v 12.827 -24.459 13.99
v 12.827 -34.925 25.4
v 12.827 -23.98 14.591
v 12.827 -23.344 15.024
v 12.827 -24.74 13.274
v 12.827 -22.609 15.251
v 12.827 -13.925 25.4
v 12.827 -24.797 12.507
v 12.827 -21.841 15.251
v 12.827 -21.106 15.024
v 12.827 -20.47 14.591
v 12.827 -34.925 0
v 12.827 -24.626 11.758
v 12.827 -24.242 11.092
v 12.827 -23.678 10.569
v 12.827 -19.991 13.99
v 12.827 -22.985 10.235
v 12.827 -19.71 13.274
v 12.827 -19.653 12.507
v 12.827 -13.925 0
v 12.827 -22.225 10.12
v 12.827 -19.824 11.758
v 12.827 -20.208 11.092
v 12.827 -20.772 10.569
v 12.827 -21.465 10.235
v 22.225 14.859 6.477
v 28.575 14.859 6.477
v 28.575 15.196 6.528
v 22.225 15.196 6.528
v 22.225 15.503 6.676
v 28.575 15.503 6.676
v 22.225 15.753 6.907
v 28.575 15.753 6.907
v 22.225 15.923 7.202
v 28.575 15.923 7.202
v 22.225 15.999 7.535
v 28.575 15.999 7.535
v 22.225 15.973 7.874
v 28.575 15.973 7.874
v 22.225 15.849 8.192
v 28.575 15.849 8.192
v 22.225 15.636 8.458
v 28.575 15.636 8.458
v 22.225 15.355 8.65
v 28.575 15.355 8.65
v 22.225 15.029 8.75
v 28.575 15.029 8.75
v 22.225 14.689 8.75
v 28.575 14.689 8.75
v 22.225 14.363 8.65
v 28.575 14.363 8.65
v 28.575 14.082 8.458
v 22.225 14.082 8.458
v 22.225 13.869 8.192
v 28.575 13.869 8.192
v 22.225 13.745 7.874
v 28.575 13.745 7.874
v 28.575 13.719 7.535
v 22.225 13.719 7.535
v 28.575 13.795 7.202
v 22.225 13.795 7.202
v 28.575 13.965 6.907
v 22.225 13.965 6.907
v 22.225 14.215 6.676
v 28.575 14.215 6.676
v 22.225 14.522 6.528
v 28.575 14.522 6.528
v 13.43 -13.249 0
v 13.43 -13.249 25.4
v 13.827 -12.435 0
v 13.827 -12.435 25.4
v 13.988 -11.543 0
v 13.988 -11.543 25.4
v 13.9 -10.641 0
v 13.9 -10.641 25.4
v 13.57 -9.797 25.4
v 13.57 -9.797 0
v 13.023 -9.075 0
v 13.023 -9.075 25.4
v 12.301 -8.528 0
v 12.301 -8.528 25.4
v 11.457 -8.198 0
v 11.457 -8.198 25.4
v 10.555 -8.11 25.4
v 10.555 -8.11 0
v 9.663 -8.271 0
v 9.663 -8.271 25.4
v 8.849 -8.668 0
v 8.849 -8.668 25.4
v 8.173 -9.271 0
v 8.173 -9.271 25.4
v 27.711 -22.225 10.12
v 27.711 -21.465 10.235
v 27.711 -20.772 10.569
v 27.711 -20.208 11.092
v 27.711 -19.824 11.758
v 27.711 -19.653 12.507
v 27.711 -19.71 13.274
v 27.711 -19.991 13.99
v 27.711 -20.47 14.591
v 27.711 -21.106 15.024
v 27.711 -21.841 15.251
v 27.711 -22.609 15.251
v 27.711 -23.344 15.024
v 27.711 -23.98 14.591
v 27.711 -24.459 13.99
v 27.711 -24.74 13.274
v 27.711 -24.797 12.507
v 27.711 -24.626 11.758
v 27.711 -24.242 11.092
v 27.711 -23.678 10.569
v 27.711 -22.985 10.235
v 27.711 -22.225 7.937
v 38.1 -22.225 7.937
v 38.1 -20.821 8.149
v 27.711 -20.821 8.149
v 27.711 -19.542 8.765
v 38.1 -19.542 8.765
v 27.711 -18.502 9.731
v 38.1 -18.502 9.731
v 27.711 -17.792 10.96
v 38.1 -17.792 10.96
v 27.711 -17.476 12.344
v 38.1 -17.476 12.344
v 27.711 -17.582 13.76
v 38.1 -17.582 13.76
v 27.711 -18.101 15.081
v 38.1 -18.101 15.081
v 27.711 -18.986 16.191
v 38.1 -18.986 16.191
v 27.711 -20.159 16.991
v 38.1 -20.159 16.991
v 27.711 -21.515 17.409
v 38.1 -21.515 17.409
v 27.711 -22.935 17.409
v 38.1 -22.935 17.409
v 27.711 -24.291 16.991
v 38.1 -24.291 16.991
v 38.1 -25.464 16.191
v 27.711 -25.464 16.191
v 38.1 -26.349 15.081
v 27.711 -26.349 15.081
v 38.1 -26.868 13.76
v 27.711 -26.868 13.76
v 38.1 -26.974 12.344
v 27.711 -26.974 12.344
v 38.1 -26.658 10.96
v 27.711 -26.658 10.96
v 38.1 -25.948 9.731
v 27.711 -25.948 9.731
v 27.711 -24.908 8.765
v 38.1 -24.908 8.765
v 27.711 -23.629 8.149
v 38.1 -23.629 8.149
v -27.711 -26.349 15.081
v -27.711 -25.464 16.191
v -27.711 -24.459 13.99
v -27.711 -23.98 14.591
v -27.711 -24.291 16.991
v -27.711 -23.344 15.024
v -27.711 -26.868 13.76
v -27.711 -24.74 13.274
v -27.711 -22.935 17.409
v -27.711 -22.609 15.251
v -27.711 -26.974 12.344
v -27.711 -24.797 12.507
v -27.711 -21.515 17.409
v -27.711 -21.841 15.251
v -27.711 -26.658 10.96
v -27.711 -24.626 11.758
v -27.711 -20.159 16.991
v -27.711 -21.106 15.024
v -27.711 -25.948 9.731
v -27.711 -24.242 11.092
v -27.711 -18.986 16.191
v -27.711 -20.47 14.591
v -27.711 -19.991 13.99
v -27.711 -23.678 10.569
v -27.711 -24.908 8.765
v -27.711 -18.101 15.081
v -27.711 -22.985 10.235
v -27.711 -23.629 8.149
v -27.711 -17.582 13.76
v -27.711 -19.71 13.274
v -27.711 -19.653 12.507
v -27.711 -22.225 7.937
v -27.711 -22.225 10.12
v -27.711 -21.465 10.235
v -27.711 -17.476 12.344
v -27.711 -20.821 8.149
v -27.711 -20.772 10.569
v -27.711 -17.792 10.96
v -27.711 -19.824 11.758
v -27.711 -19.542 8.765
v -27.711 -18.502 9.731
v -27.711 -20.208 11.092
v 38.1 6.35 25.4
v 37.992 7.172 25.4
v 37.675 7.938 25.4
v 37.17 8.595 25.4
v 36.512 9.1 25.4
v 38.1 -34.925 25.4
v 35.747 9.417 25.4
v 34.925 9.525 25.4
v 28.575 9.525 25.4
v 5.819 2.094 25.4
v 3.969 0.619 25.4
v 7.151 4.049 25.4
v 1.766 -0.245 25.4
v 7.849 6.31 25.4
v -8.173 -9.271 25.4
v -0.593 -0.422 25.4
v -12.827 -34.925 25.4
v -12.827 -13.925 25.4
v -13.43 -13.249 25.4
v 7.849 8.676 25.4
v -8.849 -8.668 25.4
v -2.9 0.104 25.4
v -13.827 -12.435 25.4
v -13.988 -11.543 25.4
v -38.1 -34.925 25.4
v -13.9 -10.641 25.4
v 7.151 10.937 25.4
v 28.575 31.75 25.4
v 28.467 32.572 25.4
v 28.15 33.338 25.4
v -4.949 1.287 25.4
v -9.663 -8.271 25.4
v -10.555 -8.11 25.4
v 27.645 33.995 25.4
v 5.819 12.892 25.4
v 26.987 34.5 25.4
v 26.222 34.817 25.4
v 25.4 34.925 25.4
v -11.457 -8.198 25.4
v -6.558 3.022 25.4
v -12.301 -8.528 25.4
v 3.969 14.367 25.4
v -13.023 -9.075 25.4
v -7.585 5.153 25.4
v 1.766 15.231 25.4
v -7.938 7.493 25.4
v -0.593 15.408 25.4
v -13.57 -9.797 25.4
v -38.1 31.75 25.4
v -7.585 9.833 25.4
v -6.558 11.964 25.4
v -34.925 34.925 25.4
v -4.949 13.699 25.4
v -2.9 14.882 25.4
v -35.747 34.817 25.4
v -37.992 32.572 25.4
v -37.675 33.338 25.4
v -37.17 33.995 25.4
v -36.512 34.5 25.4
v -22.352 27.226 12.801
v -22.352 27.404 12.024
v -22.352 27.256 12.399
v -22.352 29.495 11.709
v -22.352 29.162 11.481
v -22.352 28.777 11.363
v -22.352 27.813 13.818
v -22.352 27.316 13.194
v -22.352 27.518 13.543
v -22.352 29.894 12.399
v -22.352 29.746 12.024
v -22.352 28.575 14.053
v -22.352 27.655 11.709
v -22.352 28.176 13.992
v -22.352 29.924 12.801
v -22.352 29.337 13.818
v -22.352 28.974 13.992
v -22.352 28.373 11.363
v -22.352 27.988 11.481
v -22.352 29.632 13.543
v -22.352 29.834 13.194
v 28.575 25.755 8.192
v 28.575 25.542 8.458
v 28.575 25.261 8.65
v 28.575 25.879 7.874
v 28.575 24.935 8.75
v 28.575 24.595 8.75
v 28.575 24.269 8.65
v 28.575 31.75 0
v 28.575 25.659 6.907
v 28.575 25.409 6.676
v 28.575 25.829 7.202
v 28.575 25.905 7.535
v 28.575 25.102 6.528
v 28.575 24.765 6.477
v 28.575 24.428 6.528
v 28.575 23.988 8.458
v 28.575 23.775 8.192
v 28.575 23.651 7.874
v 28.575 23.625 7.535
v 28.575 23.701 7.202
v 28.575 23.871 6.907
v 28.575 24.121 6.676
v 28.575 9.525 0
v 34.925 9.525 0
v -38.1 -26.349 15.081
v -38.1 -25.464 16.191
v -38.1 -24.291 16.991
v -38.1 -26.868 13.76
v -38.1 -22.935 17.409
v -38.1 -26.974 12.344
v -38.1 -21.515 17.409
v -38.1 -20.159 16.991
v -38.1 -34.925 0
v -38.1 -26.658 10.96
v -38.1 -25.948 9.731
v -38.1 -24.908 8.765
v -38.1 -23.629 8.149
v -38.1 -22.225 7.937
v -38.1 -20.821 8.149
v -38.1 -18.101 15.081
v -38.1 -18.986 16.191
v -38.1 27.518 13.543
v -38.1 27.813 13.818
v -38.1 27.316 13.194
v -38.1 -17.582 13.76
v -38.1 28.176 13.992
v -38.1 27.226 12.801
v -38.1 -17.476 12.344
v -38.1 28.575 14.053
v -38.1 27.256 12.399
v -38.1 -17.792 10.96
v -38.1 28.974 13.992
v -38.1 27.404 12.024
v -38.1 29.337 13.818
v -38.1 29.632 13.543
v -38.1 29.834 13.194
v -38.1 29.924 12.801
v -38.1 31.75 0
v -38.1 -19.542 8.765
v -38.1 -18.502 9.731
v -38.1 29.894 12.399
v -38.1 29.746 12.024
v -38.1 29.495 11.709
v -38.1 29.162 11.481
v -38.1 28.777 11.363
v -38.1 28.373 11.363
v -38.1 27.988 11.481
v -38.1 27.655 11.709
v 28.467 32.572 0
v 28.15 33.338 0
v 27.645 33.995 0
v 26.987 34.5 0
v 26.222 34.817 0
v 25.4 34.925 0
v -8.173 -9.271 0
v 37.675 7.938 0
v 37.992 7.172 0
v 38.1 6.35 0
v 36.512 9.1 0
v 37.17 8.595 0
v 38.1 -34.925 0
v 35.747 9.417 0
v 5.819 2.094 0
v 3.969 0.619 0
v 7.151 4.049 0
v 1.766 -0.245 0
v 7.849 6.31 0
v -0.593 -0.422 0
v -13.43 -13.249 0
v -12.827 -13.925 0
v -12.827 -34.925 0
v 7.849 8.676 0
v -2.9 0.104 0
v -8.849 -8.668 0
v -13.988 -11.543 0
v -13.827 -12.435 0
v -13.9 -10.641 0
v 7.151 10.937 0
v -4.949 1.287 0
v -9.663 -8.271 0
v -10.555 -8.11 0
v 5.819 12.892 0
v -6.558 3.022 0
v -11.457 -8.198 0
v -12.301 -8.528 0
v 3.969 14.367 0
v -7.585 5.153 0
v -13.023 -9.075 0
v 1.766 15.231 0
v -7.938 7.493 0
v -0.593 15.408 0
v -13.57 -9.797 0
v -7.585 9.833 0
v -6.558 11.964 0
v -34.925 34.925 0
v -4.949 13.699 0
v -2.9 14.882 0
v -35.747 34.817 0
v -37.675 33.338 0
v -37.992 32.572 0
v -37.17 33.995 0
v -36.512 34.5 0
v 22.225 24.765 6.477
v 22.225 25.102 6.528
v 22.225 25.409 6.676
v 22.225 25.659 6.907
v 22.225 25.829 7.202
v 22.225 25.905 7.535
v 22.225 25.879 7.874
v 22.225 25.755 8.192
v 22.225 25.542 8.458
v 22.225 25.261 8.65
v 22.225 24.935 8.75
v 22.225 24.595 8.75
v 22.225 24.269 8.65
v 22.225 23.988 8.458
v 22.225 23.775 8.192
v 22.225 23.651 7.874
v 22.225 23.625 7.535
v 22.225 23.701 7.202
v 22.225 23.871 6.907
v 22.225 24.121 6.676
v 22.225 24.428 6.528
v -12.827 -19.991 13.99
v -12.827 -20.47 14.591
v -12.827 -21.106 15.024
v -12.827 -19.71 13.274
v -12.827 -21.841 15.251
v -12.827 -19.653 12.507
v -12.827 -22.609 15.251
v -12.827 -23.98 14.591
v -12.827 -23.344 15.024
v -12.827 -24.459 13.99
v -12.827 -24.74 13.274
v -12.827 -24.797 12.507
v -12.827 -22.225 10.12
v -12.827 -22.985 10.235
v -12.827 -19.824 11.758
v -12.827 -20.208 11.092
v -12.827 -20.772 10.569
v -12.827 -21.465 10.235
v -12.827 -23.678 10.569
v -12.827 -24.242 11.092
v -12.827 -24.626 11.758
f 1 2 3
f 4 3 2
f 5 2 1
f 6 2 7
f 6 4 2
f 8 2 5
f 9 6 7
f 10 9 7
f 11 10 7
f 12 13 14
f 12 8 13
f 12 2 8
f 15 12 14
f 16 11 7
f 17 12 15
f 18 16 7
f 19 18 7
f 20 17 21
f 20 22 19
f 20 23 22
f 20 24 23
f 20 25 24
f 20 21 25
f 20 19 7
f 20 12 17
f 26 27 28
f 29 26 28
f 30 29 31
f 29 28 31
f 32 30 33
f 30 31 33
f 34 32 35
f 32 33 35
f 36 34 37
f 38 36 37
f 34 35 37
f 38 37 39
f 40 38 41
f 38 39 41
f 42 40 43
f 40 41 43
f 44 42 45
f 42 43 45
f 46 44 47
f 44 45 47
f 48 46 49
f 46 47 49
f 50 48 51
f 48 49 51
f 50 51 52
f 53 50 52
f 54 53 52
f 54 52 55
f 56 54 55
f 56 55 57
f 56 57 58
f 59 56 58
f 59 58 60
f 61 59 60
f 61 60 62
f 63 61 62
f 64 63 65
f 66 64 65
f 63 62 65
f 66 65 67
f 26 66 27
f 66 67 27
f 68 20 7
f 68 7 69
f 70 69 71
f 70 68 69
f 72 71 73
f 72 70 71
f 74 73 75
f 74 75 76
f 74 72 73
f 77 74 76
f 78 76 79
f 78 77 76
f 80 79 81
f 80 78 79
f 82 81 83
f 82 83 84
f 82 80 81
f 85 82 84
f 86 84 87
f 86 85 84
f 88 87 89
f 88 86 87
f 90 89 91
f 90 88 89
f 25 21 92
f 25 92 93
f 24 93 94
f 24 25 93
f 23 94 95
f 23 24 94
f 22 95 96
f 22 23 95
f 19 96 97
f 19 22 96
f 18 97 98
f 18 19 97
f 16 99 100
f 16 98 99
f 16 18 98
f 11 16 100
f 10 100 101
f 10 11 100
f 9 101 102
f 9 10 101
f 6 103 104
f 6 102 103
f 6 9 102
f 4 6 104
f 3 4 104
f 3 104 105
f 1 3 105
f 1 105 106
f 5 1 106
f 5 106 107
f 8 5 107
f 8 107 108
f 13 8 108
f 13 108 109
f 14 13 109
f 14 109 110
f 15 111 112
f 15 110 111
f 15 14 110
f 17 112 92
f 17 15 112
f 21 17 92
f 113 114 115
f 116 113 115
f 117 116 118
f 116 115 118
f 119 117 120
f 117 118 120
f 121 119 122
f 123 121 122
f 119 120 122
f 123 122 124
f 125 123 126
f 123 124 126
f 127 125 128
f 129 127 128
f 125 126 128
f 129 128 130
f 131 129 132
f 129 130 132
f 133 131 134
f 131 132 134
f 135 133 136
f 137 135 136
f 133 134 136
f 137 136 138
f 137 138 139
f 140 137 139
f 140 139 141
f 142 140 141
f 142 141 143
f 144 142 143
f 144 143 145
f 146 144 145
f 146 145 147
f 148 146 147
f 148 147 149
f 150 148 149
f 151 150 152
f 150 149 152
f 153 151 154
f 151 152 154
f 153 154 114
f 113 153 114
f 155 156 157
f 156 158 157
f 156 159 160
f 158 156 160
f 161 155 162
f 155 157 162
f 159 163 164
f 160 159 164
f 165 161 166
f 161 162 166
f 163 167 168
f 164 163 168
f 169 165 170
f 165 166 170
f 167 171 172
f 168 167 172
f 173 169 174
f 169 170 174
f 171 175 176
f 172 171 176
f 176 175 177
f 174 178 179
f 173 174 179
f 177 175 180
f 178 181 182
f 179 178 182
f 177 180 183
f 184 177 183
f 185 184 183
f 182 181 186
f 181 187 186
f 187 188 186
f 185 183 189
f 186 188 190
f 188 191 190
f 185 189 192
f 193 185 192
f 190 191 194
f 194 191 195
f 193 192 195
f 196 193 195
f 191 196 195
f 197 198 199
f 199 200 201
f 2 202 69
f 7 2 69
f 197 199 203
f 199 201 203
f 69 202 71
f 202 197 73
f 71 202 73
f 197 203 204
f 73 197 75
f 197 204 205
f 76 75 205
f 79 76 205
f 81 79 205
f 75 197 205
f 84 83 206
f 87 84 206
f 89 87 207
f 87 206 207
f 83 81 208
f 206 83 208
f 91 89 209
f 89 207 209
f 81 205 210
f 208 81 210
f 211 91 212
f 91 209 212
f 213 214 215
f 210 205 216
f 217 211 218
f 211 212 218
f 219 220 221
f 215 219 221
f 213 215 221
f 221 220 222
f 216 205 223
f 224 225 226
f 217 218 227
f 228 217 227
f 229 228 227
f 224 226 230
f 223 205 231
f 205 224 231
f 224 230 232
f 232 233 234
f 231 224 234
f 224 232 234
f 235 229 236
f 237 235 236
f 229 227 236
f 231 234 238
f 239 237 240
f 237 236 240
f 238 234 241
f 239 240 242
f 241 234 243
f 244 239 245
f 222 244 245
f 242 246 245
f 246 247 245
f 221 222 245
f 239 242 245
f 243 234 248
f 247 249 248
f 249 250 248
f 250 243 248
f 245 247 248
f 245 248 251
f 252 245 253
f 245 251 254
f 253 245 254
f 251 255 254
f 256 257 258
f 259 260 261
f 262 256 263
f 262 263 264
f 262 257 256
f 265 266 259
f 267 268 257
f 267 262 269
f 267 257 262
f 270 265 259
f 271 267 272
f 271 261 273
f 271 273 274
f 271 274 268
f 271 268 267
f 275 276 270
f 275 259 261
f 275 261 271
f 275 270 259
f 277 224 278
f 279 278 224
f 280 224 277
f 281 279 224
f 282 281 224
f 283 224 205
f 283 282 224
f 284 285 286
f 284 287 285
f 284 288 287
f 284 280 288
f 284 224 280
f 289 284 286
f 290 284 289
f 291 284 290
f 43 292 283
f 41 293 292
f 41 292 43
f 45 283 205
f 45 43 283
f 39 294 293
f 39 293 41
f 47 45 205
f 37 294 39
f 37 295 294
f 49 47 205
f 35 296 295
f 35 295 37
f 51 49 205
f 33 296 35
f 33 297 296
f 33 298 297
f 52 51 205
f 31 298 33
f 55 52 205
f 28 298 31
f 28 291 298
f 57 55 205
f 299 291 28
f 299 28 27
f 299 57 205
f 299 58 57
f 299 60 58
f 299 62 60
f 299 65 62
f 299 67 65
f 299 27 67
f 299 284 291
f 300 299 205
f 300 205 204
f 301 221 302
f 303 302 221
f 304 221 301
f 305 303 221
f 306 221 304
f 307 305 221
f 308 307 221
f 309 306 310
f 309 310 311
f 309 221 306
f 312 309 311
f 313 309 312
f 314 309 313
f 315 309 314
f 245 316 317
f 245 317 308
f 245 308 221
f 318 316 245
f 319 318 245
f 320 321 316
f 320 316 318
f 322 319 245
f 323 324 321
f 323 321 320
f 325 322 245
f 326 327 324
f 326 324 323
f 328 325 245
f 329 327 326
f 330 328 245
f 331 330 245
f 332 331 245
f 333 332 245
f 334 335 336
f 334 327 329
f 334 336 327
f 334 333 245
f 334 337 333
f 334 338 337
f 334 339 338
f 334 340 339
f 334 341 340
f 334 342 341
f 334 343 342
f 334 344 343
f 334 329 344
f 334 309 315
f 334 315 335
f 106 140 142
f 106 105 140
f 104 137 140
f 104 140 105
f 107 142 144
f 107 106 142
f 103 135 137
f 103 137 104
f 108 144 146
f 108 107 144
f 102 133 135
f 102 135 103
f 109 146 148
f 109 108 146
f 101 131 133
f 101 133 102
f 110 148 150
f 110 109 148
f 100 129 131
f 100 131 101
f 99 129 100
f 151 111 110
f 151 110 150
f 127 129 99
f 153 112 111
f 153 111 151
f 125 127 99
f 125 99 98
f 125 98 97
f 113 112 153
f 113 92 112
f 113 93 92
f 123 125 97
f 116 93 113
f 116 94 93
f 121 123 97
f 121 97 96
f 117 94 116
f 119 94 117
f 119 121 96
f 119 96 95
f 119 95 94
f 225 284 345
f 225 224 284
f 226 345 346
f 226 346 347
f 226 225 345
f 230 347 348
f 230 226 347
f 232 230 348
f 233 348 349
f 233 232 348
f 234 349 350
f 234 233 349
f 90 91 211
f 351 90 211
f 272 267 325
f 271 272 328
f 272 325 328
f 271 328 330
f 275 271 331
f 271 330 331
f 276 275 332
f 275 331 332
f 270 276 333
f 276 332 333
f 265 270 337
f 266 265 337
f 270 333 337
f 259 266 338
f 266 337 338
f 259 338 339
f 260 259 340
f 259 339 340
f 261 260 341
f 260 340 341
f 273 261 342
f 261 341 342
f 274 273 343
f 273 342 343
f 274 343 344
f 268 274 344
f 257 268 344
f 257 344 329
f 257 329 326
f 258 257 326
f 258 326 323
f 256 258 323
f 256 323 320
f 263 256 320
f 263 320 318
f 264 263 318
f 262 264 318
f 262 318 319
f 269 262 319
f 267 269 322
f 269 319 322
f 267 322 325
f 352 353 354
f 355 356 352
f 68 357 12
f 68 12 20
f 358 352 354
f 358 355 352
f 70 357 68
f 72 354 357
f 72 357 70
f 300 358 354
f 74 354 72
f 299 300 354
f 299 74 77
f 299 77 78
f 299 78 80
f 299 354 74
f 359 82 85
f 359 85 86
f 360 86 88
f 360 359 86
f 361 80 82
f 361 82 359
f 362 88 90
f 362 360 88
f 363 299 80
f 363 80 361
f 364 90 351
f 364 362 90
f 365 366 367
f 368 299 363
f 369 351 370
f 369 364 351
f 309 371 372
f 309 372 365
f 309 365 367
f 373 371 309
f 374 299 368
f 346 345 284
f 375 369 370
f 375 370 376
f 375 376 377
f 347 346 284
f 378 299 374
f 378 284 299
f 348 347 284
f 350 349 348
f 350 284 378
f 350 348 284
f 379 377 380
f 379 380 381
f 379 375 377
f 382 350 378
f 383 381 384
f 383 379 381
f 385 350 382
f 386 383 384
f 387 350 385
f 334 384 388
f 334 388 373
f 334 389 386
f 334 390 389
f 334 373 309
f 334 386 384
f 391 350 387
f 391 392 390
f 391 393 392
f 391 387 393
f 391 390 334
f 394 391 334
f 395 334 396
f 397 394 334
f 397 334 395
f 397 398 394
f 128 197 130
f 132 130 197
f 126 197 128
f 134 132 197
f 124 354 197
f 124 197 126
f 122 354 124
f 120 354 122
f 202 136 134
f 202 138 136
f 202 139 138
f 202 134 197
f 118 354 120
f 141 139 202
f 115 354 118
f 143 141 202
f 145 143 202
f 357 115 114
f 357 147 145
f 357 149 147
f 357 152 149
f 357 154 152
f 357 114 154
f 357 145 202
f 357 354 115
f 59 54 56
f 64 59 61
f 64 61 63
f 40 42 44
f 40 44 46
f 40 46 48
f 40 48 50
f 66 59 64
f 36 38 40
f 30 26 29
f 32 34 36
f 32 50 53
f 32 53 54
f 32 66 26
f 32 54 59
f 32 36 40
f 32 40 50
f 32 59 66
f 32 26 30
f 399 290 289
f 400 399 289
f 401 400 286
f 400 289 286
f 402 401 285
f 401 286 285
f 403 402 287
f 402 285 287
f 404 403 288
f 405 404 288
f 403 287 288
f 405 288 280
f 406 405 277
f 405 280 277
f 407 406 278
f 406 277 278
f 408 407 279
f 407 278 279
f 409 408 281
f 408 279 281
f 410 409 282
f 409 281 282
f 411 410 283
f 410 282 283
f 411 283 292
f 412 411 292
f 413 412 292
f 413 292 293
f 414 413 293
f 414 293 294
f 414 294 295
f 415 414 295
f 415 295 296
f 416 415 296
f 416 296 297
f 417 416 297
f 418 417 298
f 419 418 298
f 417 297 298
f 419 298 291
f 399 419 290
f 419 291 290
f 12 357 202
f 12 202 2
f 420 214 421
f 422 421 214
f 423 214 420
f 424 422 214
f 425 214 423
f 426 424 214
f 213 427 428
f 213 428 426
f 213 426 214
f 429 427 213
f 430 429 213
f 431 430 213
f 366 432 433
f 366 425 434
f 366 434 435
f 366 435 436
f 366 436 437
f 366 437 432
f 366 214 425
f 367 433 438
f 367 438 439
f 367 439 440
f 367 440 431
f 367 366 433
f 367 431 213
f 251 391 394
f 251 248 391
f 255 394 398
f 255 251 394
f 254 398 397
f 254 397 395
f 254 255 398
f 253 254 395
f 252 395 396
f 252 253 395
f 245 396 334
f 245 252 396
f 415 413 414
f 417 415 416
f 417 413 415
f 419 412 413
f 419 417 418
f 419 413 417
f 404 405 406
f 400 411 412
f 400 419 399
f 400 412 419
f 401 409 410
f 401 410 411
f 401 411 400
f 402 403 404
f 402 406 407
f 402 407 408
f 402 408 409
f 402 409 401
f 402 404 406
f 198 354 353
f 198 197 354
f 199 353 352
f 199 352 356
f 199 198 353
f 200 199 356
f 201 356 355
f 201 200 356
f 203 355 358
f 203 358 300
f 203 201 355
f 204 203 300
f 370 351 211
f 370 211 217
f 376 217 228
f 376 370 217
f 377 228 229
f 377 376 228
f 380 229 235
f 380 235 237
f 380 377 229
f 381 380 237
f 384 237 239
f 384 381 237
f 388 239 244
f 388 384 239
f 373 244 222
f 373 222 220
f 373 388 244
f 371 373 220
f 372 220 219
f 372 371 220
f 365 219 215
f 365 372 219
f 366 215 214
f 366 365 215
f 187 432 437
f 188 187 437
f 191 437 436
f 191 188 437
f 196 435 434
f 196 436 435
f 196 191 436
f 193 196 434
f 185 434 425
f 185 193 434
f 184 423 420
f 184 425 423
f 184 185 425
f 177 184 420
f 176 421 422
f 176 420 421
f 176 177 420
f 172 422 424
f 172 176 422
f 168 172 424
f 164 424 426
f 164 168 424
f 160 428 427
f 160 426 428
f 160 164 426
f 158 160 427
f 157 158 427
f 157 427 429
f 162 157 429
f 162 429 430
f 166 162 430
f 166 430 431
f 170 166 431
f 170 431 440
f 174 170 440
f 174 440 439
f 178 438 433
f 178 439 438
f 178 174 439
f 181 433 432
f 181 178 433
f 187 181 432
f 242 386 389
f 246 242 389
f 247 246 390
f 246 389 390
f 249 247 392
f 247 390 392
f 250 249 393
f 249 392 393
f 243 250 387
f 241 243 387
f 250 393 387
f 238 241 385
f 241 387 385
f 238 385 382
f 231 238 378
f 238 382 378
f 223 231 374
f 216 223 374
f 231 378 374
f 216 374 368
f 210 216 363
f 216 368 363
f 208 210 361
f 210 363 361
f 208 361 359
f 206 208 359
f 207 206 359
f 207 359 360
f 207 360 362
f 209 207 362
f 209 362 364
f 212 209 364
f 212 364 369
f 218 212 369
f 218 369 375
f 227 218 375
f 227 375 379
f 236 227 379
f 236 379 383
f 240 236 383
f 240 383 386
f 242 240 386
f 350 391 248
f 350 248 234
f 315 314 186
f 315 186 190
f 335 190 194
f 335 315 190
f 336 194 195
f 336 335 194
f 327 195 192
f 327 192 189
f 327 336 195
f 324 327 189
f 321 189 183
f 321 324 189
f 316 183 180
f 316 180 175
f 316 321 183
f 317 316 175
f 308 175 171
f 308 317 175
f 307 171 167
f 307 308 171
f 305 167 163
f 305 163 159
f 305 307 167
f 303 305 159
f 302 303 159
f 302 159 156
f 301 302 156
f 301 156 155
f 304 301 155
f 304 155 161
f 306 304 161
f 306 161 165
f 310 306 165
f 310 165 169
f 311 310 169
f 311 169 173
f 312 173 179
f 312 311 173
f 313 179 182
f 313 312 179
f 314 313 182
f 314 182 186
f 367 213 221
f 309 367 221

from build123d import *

# Parameters (mm, degrees)
SKETCH1_R           = 6.35
BOSS_EXTRUDE1_DEPTH = 25.4
SKETCH2_R           = 7.9375
CUT_EXTRUDE1_DEPTH  = 26.4
FILLET1_R           = 3.175
CUT_EXTRUDE2_START  = -76.2
SKETCH3_R           = 2.5796875
CUT_EXTRUDE2_DEPTH  = 76.2
SKETCH4_R           = 1.35255
CUT_EXTRUDE3_DEPTH  = 15.748
SKETCH5_R           = 4.7625
CUT_EXTRUDE4_DEPTH  = 10.3886
SKETCH6_R           = 1.143
CUT_EXTRUDE5_DEPTH  = 6.35


with BuildPart() as part:
    # Sketch1 → Boss-Extrude1 (new body)
    with BuildSketch(Plane.XY):
        with BuildLine():
            Line((38.1, -34.925), (12.827, -34.925))
            Line((12.827, -34.925), (12.827, -13.92549629))
            ThreePointArc((12.827, -13.92549629), (13.023080834, -9.074919166), (8.17250371, -9.271))
            Line((8.17250371, -9.271), (-8.17250371, -9.271))
            ThreePointArc((-8.17250371, -9.271), (-13.023080834, -9.074919166), (-12.827, -13.92549629))
            Line((-12.827, -13.92549629), (-12.827, -34.925))
            Line((-12.827, -34.925), (-38.1, -34.925))
            Line((-38.1, -34.925), (-38.1, 34.925))
            Line((-38.1, 34.925), (28.575, 34.925))
            Line((28.575, 34.925), (28.575, 30.099))
            Line((28.575, 30.099), (28.575, 9.525))
            Line((28.575, 9.525), (38.1, 9.525))
            Line((38.1, 9.525), (38.1, -34.925))
        make_face()
        with Locations((0, 7.493)):
            Circle(SKETCH1_R, mode=Mode.SUBTRACT)
    extrude(amount=BOSS_EXTRUDE1_DEPTH)

    # Sketch2 → Cut-Extrude1 (cut, through all)
    with BuildSketch(Plane(origin=(0, 0, 0), x_dir=(-1, 0, 0), z_dir=(0, 0, -1))):
        with Locations((0, 7.493)):
            Circle(SKETCH2_R)
    extrude(amount=-CUT_EXTRUDE1_DEPTH, mode=Mode.SUBTRACT)

    # Fillet1
    fillet1_edges = [part.edges().sort_by_distance(p)[0] for p in [
        (-38.1, 34.925, 12.7),
        (28.575, 34.925, 12.7),
        (38.1, 9.525, 12.7),
    ]]
    fillet(fillet1_edges, radius=FILLET1_R)

    # Sketch3 → Cut-Extrude2 (cut)
    with BuildSketch(Plane(origin=(38.1, 0, 0), x_dir=(0, 0, -1), z_dir=(1, 0, 0)).offset(CUT_EXTRUDE2_START)):
        with Locations((-12.7, -22.225)):
            Circle(SKETCH3_R)
    extrude(amount=CUT_EXTRUDE2_DEPTH, mode=Mode.SUBTRACT)

    # Sketch4 → Cut-Extrude3 (cut)
    with BuildSketch(Plane.ZY.offset(38.1)):
        with Locations((12.7, 28.575)):
            Circle(SKETCH4_R)
    extrude(amount=-CUT_EXTRUDE3_DEPTH, mode=Mode.SUBTRACT)

    # Sketch5 → Cut-Extrude4 (cut)
    with BuildSketch(Plane(origin=(38.1, 0, 0), x_dir=(0, 0, -1), z_dir=(1, 0, 0))):
        with Locations((-12.7, -22.225)):
            Circle(SKETCH5_R)
    cut_extrude4 = extrude(amount=-CUT_EXTRUDE4_DEPTH, mode=Mode.SUBTRACT)

    # Mirror1: Cut-Extrude4 across plane
    add(cut_extrude4.mirror(Plane(origin=(0, 0, 0), x_dir=(0, 0, 1), z_dir=(1, 0, 0))), mode=Mode.SUBTRACT)

    # Sketch6 → Cut-Extrude5 (cut)
    with BuildSketch(Plane(origin=(28.575, 0, 0), x_dir=(0, 0, -1), z_dir=(1, 0, 0))):
        with Locations((-7.62, 14.859)):
            Circle(SKETCH6_R)
        with Locations((-7.62, 24.765)):
            Circle(SKETCH6_R)
    extrude(amount=-CUT_EXTRUDE5_DEPTH, mode=Mode.SUBTRACT)


solid = part.part
